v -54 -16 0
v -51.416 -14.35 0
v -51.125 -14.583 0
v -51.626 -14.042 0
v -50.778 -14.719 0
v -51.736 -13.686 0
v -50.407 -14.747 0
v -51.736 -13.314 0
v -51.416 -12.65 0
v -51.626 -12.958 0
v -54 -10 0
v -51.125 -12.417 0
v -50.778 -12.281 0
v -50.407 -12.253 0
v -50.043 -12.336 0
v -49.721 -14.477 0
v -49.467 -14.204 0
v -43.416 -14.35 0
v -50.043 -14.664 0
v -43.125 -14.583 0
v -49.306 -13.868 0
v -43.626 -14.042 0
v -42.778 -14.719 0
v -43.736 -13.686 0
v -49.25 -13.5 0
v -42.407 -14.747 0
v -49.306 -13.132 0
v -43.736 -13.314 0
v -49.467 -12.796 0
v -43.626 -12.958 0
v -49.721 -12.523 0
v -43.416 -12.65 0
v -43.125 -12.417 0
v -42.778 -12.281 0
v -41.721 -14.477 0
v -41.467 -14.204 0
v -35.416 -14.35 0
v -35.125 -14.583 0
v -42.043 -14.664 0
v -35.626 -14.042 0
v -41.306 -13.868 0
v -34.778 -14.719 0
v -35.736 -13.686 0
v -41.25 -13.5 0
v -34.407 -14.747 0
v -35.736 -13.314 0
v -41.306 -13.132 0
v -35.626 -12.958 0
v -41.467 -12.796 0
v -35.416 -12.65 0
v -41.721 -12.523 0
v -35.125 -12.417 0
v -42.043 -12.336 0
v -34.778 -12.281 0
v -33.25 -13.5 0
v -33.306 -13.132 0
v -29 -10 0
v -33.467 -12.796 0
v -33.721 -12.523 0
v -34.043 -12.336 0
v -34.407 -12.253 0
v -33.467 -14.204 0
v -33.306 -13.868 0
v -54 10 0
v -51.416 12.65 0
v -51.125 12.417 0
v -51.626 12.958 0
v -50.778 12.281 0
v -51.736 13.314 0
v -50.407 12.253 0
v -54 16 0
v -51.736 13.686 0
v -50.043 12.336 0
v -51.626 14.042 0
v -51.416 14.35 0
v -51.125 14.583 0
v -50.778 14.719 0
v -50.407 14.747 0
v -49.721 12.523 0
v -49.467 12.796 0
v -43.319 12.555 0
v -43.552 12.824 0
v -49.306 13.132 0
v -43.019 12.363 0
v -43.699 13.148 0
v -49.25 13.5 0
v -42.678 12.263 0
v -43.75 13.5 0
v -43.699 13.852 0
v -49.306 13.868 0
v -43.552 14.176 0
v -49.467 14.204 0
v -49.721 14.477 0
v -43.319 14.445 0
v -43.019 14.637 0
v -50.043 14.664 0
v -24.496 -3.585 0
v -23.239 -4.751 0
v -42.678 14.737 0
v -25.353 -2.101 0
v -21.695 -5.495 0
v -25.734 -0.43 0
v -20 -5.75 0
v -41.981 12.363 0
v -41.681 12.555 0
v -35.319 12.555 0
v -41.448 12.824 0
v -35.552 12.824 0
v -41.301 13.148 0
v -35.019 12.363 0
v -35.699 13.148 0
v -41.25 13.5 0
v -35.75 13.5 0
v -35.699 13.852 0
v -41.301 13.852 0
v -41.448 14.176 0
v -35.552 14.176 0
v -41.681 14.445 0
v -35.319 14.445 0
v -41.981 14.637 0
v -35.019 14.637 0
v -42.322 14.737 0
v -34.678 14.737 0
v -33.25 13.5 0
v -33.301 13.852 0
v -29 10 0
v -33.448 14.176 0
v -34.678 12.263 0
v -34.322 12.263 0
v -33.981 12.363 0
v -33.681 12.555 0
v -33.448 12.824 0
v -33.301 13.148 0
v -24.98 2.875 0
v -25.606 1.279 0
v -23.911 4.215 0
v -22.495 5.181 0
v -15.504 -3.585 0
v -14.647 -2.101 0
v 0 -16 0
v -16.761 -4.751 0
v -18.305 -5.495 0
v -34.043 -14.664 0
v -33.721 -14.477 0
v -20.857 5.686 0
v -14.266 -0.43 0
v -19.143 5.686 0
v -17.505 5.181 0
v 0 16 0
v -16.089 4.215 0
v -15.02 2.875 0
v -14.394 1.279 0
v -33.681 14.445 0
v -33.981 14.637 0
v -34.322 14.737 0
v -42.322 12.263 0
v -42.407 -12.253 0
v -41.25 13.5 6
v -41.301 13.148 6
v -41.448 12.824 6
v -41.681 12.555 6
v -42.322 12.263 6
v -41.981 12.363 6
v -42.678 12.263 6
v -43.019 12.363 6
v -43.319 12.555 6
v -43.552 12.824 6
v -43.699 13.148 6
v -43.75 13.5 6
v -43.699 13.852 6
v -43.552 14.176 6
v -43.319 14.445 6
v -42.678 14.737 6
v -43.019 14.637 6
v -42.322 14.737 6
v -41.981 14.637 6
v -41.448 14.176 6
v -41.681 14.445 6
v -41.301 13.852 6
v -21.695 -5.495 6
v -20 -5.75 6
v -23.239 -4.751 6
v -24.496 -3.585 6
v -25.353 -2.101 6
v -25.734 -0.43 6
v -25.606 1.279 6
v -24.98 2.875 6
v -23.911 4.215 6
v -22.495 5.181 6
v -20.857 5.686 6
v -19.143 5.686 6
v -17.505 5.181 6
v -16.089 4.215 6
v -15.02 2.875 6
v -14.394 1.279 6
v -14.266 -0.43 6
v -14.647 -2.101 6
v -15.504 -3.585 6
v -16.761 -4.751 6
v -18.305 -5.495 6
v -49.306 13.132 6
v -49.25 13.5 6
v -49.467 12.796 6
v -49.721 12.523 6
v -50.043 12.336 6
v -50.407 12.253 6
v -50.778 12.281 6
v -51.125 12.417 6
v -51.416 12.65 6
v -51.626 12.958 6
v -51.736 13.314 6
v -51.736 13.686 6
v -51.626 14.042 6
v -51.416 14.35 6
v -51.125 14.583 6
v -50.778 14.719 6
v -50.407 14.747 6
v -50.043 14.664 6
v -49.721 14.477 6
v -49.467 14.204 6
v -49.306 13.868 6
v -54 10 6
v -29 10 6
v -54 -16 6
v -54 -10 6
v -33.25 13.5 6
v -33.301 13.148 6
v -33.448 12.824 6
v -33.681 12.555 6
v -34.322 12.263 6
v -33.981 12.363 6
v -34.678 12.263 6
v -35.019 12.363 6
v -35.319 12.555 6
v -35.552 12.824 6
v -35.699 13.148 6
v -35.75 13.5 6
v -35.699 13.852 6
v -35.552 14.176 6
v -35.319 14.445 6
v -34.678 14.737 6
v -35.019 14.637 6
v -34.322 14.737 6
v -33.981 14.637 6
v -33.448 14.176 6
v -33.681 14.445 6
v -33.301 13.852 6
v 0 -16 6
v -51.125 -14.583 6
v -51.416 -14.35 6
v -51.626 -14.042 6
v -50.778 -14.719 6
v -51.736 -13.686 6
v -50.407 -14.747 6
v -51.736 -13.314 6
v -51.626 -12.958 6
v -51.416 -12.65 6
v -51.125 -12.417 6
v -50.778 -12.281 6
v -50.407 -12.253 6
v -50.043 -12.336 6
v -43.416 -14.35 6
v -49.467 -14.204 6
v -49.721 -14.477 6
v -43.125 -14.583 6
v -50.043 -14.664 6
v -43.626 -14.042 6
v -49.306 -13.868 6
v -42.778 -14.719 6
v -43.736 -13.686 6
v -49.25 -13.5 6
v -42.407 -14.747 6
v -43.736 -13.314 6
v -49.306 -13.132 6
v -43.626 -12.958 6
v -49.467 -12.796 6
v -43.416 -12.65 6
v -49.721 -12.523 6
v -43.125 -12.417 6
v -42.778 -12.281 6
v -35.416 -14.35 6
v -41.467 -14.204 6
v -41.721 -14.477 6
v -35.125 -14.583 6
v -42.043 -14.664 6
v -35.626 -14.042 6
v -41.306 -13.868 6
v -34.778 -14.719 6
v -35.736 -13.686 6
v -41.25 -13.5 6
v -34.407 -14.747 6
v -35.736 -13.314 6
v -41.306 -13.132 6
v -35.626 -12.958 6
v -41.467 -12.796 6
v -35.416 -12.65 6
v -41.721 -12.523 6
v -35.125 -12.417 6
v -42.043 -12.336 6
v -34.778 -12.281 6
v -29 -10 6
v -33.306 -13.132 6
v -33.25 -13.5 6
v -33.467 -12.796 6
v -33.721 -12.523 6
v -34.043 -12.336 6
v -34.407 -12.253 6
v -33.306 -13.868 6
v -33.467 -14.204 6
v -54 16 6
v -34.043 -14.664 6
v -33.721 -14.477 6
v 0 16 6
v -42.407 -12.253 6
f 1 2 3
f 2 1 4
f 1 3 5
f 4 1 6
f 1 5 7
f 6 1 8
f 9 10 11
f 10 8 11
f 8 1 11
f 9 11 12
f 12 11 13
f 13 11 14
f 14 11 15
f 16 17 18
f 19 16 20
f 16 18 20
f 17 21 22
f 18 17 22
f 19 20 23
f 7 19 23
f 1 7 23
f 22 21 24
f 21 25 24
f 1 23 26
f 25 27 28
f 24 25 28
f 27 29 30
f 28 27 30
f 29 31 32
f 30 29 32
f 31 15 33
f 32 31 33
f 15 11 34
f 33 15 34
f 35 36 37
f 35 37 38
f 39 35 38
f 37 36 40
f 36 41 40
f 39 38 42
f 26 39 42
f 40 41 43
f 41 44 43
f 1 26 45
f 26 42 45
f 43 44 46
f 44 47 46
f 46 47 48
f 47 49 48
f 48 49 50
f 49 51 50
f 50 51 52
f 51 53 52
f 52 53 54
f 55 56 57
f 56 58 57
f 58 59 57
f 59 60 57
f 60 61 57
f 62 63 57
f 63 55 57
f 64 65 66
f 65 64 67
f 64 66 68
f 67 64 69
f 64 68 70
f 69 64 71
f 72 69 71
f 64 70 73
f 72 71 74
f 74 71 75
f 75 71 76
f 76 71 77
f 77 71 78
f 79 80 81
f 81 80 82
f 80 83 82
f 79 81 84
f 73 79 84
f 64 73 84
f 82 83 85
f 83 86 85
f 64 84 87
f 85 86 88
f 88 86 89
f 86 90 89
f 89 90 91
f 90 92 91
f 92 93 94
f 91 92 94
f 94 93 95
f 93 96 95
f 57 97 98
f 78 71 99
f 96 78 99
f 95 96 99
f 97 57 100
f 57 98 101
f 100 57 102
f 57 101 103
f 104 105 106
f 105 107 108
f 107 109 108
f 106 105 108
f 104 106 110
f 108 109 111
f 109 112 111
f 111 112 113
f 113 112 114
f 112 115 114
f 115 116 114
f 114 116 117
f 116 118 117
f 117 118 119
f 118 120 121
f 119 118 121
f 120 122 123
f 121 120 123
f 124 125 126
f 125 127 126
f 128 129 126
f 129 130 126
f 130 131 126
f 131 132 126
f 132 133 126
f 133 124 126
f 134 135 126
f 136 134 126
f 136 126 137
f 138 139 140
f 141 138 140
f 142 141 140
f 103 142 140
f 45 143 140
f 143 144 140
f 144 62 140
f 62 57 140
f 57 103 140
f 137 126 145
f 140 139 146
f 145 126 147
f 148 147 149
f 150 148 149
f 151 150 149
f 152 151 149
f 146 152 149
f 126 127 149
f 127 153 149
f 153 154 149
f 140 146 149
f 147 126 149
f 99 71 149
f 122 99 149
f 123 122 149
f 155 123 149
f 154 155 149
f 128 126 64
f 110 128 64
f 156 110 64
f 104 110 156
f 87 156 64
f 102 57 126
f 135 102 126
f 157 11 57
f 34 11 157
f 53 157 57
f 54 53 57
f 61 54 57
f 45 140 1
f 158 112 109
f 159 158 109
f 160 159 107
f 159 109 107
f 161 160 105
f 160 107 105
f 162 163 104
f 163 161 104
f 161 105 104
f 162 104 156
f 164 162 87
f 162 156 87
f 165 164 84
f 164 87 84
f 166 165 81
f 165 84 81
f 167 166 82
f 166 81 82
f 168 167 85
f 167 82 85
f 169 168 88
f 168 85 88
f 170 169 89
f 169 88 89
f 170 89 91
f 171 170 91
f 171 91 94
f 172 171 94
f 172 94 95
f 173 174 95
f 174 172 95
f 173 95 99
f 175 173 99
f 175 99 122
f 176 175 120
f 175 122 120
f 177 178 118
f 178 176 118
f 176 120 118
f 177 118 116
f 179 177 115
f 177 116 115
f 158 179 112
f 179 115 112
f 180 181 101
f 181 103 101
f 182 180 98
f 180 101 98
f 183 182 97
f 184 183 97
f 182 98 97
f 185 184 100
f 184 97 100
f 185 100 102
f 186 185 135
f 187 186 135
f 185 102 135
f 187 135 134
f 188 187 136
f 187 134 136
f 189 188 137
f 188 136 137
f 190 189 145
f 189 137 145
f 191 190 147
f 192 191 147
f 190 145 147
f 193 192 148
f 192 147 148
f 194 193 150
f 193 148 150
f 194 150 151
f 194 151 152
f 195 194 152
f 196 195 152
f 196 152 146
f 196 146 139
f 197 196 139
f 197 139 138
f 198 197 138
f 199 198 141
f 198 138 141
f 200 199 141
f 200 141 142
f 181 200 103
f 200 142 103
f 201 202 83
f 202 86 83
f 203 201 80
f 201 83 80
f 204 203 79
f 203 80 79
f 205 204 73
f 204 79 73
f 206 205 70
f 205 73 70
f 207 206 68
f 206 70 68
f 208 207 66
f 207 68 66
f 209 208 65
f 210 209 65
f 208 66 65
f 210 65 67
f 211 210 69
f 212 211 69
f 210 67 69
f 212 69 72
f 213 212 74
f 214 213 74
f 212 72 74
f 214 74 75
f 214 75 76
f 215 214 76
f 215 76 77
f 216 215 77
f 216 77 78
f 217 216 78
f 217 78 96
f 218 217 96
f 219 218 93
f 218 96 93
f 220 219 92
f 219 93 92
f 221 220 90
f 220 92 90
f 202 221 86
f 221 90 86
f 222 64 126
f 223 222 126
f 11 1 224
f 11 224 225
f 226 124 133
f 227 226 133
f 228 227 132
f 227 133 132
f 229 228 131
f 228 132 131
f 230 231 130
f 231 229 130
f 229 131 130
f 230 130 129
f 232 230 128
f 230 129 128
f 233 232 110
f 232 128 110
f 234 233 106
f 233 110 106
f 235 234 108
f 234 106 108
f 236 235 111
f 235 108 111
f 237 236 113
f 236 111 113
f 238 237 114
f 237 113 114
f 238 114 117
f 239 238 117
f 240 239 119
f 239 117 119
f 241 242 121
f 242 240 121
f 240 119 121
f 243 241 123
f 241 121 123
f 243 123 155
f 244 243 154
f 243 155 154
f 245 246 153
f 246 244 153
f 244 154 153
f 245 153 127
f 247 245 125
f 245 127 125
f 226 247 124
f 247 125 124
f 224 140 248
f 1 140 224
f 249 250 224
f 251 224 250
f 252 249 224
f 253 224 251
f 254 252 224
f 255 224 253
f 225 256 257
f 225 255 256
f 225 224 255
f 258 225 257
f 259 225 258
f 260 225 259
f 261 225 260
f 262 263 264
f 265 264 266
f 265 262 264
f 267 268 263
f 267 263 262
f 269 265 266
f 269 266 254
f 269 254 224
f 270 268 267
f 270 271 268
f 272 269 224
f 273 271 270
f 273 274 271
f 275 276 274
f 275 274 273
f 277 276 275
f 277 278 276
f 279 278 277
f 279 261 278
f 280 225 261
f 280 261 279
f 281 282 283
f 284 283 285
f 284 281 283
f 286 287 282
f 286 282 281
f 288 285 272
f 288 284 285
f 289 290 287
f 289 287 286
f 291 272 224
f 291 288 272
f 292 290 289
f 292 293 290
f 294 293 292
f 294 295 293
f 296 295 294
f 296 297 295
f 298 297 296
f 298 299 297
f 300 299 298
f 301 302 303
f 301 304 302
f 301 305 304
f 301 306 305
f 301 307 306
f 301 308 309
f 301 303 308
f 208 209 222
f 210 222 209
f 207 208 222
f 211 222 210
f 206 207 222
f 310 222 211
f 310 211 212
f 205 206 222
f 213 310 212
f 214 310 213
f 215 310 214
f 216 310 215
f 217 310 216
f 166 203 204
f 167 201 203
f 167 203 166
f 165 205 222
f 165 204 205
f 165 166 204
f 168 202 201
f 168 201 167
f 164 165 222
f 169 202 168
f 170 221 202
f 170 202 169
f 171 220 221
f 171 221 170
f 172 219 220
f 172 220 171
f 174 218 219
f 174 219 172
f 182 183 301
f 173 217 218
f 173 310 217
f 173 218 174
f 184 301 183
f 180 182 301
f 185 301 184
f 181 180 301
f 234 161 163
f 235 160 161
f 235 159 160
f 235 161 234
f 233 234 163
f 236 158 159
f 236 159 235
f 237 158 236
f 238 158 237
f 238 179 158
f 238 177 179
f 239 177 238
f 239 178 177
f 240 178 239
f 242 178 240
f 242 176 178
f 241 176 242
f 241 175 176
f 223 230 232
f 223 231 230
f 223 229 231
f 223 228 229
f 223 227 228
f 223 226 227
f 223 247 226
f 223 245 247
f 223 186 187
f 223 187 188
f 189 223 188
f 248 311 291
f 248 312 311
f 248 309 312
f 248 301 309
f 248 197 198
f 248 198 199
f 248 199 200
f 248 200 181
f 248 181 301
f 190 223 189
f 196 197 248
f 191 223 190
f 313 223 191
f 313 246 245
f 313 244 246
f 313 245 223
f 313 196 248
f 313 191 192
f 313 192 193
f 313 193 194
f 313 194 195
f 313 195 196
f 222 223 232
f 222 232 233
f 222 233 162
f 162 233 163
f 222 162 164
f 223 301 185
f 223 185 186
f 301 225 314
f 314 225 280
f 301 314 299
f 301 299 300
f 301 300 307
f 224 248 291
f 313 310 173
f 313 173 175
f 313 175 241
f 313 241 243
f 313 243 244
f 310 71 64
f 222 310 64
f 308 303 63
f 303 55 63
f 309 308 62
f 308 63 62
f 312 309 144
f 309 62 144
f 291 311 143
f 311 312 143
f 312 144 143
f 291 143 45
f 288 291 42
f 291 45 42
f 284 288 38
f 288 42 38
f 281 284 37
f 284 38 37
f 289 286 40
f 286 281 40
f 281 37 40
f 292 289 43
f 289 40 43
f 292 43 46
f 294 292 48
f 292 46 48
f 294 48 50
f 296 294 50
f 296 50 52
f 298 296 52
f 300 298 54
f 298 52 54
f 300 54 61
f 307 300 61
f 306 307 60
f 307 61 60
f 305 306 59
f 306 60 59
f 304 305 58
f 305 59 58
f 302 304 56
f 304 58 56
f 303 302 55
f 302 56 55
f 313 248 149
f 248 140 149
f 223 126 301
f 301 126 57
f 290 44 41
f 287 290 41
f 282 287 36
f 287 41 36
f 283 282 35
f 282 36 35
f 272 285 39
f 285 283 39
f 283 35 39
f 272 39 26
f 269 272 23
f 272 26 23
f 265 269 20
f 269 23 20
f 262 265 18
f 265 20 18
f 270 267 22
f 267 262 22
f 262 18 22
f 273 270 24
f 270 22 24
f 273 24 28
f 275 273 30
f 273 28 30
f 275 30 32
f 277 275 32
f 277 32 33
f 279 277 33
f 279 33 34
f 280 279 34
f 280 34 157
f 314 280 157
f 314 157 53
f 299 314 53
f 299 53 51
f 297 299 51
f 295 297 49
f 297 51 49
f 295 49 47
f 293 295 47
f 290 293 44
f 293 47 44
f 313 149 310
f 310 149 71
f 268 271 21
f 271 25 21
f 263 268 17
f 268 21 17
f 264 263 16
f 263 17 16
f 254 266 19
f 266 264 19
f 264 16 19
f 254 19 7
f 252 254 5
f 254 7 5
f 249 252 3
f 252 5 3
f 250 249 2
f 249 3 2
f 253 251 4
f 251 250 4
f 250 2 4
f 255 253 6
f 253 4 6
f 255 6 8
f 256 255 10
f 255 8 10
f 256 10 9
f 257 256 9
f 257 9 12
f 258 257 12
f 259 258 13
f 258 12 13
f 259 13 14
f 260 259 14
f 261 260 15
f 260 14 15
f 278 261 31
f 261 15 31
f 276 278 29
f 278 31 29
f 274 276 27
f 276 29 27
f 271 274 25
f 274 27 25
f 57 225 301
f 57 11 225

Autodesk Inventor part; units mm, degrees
ref_plane "YZ Plane" through (0, 0, 0) normal (1, 0, 0) x (0, 1, 0)
ref_plane "XZ Plane" through (0, 0, 0) normal (0, 1, 0) x (-1, 0, 0)
ref_plane "XY Plane" through (0, 0, 0) normal (0, 0, 1) x (1, 0, 0)
sketch "Boceto1" plane through (0, 0, 0) normal (0, 0, 1) x (1, 0, 0)
  line L0 (0, 0) -> (0, 16)
  line L1 (0, 16) -> (-54, 16)
  line L2 (-54, 16) -> (-54, 10)
  line L3 (-54, 10) -> (-29, 10)
  line L4 (0, 0) -> (-39.6047, 0)
  line L5 (-29, 10) -> (-29, 0)
  line L6 (-54, 13.5) -> (-50.5, 13.5)
  line L7 (-50.5, 13.5) -> (-50.5, 10)
  circle A0 centre (-50.5, 13.5) radius 1.25
  line L8 (-50.5, 13.5) -> (-42.5, 13.5)
  line L9 (-42.5, 13.5) -> (-34.5, 13.5)
  circle A1 centre (-42.5, 13.5) radius 1.25
  circle A2 centre (-34.5, 13.5) radius 1.25
  line L10 (0, 0) -> (0, -16)
  line L11 (0, -16) -> (-54, -16)
  line L12 (-54, -16) -> (-54, -10)
  line L13 (-54, -10) -> (-29, -10)
  line L14 (-29, -10) -> (-29, 0)
  circle A3 centre (-50.5, -13.5) radius 1.25
  circle A4 centre (-42.5, -13.5) radius 1.25
  circle A5 centre (-34.5, -13.5) radius 1.25
  point P0 (-54, -13.5)
  point P1 (-50.5, 12.25)
  point P2 (-51.75, 13.5)
  dimension "d0" = 10
  dimension "d1" = 25
  dimension "d2" = 6
  dimension "d3" = 54
  dimension "d4" = 3.5
  dimension "d5" = 3.5
  dimension "d6" = 2.5
  dimension "d7" = 8
  dimension "d8" = 8
  dimension "d9" = 2.5
  dimension "d10" = 2.5
extrude "Extrusión1" add sketch "Boceto1" along normal blind 6 contours L4 L5 L3 L7 A0 L6 L2 L1 L0 | L10 L11 L12 L13 L14 L4 | L6 A0 L7 L3 L2
sketch "Boceto2" plane through (0, 0, 6) normal (0, 0, 1) x (1, 0, 0)
  circle A0 centre (-50.5, 13.5) radius 1.25 projected
  line L0 (-50.5, 13.5) -> (-20, 13.5)
  line L1 (-54, 10) -> (-29, 10) projected
  line L2 (-20, 13.5) -> (-20, 0)
  point P0 (0, 0)
  dimension "d13" = 30.5
hole "Agujero1" at (-20, 0, 6) direction (0, 0, -1) diameter 11.5 end through all
properties part number "Sopoter_gripperM"
